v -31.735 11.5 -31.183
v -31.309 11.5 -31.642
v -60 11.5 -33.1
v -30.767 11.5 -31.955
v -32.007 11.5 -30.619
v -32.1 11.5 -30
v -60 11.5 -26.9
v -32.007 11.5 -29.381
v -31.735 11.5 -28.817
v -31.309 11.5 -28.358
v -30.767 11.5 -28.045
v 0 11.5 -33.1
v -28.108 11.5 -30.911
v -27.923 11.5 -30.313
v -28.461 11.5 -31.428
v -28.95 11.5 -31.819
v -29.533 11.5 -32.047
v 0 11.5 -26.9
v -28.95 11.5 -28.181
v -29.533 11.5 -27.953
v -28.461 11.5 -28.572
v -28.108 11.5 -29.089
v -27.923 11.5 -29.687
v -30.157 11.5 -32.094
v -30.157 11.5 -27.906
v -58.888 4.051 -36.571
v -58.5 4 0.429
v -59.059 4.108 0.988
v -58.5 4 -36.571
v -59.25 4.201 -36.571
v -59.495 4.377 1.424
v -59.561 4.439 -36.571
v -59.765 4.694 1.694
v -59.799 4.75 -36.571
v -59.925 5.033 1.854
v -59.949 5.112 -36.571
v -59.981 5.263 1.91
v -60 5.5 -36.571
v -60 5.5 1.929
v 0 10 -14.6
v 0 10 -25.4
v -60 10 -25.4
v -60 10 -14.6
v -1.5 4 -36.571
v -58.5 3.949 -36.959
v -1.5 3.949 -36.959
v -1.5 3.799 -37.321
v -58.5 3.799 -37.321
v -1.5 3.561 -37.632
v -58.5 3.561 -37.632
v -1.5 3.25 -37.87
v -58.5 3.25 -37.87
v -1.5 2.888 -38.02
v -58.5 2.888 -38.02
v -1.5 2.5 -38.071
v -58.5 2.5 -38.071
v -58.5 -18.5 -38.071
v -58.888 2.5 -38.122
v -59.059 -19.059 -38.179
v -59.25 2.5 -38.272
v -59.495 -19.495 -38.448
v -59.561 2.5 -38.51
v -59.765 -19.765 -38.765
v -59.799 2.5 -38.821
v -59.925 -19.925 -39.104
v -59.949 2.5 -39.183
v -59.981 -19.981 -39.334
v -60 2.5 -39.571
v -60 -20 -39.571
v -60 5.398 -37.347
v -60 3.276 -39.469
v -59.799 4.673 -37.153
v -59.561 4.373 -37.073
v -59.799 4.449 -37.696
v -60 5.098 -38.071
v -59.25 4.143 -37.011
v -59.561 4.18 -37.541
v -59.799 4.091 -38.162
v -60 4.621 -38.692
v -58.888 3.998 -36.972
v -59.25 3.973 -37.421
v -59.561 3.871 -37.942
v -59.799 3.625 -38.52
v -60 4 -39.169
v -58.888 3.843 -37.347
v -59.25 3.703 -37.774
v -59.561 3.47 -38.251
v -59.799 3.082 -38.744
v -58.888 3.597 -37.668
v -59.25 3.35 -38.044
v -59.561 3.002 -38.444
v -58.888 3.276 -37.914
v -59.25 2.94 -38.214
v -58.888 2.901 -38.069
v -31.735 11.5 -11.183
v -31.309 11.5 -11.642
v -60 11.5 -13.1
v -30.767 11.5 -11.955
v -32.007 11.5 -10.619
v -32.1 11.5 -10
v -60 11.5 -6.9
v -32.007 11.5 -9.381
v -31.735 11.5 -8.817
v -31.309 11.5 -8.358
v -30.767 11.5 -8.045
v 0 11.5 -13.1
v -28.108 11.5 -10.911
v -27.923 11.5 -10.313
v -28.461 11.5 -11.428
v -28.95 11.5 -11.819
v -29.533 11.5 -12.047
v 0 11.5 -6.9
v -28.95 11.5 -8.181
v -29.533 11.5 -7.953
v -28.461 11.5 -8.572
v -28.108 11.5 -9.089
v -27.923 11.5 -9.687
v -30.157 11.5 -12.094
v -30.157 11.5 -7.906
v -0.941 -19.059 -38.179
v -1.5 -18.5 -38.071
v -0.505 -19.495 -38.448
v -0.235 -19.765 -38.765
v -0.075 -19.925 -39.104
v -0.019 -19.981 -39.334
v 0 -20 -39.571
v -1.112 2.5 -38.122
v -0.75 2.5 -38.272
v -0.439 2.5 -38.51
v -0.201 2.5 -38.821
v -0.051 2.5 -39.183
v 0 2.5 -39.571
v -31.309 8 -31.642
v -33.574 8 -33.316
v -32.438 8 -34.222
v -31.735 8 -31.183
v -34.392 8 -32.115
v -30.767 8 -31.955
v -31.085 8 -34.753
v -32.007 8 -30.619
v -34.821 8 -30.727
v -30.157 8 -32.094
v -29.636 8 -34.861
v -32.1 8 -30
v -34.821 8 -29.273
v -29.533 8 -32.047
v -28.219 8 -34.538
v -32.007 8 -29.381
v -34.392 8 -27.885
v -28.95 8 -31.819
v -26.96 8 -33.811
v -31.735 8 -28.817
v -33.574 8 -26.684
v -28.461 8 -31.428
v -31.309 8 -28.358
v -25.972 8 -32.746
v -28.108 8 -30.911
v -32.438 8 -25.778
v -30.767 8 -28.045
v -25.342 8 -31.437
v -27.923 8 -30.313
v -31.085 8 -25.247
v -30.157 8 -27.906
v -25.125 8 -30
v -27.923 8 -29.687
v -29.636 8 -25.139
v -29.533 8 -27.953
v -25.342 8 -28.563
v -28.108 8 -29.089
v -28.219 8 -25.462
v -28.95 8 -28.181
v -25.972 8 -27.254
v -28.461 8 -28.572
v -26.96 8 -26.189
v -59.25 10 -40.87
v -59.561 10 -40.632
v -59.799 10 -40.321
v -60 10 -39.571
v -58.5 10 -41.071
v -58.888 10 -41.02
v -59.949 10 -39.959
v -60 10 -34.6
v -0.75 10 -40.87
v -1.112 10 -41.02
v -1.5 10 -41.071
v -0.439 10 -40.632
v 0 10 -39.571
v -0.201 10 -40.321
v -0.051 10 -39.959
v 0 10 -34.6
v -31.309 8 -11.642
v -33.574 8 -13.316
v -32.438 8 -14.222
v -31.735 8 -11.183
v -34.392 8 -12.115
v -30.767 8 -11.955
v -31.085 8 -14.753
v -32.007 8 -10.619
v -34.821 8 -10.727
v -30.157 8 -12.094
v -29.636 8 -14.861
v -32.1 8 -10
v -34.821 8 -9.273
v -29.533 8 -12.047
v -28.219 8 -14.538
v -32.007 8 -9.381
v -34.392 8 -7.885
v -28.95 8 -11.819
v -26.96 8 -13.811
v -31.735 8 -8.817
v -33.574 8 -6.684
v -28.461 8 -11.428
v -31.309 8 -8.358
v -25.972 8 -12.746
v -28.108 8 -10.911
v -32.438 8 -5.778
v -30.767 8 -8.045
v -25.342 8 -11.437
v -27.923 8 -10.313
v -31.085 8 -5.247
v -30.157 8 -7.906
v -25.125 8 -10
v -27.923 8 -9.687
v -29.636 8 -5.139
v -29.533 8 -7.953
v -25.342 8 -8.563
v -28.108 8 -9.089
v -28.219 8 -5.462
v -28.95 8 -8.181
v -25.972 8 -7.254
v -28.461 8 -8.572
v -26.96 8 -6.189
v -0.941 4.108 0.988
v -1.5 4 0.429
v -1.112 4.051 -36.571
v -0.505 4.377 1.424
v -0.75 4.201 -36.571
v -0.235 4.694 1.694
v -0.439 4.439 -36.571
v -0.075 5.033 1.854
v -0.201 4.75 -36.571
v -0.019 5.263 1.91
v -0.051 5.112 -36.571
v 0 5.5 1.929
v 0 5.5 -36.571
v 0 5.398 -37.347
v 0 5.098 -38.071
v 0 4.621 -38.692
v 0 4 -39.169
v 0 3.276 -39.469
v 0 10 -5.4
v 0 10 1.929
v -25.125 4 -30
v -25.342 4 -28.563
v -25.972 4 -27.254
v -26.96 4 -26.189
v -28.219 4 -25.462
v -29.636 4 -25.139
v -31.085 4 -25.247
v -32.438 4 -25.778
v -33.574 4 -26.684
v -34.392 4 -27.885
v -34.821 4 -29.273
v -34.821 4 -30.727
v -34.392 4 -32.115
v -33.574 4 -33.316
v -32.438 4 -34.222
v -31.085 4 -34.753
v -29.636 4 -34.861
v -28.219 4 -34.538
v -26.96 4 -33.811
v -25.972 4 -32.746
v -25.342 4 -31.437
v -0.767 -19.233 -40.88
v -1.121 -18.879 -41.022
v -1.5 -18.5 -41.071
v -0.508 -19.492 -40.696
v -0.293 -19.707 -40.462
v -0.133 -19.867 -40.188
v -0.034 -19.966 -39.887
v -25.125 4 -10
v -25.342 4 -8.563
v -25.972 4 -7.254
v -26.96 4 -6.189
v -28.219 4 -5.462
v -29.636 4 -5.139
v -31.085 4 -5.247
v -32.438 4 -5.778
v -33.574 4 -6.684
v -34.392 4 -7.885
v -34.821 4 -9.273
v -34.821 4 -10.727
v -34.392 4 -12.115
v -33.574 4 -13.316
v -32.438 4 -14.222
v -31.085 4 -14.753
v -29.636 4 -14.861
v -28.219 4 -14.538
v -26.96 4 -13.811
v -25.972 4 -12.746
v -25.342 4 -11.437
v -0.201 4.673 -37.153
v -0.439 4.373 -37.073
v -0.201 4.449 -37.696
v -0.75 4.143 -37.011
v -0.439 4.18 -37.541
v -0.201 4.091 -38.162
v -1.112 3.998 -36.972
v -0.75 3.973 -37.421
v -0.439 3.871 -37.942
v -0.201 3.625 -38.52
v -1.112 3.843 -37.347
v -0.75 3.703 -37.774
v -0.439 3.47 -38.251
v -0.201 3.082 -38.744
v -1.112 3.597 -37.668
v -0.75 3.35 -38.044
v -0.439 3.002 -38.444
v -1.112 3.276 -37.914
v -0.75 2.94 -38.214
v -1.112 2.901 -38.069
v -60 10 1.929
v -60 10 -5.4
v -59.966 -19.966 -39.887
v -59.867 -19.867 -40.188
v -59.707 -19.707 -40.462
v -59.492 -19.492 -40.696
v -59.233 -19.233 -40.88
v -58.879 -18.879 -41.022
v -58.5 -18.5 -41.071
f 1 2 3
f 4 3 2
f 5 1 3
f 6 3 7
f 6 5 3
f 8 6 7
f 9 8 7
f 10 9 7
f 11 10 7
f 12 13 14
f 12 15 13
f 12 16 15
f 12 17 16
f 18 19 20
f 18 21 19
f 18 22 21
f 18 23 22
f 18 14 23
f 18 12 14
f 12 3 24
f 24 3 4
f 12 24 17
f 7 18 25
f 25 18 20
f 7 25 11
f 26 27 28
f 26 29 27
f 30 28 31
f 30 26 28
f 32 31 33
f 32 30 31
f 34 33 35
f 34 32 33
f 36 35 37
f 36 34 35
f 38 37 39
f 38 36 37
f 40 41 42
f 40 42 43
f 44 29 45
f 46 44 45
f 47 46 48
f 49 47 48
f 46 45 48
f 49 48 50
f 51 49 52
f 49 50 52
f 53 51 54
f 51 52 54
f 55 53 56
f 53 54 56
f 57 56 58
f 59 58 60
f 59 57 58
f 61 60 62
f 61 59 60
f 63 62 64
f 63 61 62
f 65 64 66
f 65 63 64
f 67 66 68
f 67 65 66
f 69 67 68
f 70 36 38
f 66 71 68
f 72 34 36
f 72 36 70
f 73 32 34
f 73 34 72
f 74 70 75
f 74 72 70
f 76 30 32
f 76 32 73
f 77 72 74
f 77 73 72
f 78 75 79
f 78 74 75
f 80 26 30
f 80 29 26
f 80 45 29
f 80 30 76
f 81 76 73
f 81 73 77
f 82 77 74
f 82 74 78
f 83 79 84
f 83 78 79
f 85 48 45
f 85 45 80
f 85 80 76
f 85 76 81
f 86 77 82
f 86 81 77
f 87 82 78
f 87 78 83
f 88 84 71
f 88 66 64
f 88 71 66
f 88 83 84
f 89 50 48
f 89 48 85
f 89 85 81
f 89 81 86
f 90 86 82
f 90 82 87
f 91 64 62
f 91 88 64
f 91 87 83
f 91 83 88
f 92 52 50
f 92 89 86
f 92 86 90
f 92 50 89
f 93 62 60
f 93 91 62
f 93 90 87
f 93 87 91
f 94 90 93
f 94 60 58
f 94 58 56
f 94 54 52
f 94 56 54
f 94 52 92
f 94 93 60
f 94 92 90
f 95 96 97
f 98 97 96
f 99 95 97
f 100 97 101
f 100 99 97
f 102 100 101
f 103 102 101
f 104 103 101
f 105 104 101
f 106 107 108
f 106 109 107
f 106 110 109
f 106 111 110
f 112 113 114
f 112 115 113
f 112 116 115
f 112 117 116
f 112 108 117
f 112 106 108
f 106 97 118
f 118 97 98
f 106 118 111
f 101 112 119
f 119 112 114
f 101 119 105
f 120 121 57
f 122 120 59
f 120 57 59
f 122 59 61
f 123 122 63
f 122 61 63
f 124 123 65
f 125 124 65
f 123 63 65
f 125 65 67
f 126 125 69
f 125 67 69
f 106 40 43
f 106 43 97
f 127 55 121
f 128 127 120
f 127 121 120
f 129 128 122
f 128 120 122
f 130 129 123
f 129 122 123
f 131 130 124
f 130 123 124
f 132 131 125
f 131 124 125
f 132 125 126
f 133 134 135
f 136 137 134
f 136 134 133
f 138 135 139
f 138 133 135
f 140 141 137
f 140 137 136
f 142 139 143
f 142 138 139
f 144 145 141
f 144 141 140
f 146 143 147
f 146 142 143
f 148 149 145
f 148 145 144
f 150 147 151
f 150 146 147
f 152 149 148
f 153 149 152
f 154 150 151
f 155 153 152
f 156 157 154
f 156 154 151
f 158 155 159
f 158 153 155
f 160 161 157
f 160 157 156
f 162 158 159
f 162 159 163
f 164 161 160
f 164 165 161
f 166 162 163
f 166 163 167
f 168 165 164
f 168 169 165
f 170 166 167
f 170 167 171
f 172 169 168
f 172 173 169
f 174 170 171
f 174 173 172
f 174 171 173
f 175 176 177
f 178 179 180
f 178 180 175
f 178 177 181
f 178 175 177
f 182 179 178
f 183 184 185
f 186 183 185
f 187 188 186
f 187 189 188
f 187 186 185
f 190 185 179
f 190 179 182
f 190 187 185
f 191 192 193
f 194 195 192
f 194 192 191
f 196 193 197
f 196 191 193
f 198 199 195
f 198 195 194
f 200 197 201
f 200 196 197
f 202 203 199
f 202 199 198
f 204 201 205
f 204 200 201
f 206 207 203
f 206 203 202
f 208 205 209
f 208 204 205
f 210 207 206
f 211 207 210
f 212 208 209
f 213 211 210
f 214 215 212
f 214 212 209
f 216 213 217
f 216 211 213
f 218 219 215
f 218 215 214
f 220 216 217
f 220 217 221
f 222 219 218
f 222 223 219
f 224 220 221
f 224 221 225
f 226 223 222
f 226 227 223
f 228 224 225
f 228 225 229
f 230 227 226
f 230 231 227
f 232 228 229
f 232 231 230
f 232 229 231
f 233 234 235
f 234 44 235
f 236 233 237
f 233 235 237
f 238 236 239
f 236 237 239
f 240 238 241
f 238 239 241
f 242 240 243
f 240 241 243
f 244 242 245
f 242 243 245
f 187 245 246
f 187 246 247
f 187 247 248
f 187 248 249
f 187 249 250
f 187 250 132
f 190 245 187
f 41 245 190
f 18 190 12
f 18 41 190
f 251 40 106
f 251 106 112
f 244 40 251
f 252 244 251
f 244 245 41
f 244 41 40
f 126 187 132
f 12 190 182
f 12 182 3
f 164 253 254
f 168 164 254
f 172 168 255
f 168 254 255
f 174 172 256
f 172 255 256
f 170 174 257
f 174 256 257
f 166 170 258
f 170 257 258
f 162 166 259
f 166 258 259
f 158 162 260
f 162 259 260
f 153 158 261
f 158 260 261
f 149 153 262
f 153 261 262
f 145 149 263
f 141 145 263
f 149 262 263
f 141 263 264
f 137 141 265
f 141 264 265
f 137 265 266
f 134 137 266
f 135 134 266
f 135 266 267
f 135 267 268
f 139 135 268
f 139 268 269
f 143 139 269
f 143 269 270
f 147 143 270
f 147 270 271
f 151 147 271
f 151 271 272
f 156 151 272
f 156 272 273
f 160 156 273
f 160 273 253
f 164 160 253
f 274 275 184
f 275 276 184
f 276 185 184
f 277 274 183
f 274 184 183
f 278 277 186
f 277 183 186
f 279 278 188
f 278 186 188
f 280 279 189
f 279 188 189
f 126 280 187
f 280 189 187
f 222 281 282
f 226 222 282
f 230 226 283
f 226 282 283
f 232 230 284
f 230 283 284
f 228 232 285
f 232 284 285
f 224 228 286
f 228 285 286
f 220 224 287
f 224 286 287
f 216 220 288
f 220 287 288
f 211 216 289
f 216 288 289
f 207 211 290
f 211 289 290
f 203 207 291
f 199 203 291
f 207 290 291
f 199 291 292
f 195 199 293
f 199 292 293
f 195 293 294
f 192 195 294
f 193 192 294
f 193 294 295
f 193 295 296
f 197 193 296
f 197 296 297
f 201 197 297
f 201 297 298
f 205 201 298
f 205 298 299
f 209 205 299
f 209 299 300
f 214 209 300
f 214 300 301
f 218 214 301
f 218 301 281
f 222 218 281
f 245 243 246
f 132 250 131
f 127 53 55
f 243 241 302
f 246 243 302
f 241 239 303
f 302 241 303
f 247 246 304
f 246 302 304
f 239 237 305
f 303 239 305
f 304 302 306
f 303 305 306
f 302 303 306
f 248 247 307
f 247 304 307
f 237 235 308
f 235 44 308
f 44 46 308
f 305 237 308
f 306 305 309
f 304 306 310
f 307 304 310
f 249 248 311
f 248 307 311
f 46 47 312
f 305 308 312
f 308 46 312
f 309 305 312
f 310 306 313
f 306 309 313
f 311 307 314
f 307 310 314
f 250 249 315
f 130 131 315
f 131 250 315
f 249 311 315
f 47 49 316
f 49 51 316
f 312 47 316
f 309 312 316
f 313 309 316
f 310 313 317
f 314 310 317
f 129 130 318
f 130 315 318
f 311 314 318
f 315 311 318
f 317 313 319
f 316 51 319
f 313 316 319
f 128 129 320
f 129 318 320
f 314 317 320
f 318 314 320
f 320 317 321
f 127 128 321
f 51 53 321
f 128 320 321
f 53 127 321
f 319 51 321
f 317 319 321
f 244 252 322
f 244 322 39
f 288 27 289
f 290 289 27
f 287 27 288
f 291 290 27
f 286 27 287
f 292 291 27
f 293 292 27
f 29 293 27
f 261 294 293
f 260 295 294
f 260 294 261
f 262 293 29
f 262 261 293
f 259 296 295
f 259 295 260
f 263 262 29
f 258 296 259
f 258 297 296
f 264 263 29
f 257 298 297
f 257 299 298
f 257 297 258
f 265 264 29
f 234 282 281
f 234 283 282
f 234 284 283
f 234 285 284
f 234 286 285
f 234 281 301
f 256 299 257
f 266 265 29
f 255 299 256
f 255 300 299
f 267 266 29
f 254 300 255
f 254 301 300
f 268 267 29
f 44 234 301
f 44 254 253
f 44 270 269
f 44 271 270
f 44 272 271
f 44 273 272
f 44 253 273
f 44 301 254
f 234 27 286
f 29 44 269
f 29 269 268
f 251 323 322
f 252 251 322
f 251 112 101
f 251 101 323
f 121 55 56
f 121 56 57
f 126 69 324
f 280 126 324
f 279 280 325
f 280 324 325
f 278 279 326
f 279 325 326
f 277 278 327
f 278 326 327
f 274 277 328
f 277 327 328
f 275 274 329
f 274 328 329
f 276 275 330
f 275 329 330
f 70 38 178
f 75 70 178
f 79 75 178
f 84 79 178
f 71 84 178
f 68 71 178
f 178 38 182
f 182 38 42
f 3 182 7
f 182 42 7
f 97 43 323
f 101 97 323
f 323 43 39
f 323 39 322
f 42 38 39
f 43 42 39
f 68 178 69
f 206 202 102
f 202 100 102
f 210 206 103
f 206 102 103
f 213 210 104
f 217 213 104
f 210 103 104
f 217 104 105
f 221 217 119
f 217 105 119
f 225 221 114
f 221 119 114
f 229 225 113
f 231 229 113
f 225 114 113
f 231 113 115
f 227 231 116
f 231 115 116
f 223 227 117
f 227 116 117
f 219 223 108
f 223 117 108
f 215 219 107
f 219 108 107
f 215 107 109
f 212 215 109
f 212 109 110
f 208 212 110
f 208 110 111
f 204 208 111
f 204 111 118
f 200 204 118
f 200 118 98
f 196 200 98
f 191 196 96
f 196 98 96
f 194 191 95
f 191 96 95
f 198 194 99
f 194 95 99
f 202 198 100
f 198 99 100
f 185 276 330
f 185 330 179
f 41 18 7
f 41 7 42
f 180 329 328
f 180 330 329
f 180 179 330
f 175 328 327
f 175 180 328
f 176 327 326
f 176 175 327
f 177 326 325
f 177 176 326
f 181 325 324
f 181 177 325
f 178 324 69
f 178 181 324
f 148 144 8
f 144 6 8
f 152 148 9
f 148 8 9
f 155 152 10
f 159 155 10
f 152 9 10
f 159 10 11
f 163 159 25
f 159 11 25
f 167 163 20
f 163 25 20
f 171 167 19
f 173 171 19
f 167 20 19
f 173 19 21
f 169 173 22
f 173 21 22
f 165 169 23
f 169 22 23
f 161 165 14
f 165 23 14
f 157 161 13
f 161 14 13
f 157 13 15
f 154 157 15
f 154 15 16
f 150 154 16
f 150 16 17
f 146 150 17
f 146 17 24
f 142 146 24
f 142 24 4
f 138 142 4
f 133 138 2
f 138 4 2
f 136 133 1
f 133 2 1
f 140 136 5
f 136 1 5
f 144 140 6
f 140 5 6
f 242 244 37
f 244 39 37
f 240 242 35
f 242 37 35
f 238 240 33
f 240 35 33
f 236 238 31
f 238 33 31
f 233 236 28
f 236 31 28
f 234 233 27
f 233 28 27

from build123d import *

# Parameters (mm, degrees)
F1_DEPTH       = 60
F2_R           = 1.49999
F4_D           = 4.2
F4_CBORE_D     = 9.75
F4_CBORE_DEPTH = 4


# Not quite as in the source:
# - a fillet or chamfer is up to 0.001 mm smaller than in the source, because OpenCascade refuses the exact size
# - a feature names something its author has since deleted; it is built from what else it names


with BuildPart() as f1:
    # F0 (on Right) → F1 (new body)
    with BuildSketch(Plane.YZ):
        Polygon((10, 1.9290046394), (4, 1.9290046394), (4, -38.0709953606), (-20, -38.0709953606), (-20, -41.0709953606), (10, -41.0709953606), (10, -34.6), (11.5, -33.1), (11.5, -26.9), (10, -25.4), (10, -14.6), (11.5, -13.1), (11.5, -6.9), (10, -5.4), align=None)
    extrude(amount=-F1_DEPTH)

    # F2 (radius 1.5 in the source; OpenCascade refuses exactly that, so slightly less here)
    f2_edges = [f1.edges().sort_by_distance(p)[0] for p in [
        (0, 4, -18.070995),
        (-60, 4, -18.070995),
        (0, -8, -38.070995),
        (-30, -20, -38.070995),
        (-60, -8, -38.070995),
        (-30, 4, -38.070995),
        (-30, -20, -41.070995),
        (0, -5, -41.070995),
        (-60, -5, -41.070995),
        (-30, 4, 1.929005),
    ]]
    fillet(f2_edges, radius=F2_R)

    # F4 (through all)
    with Locations(Plane.XZ.offset(-4)):
        with Locations((-30, -9.9999953606), (-30, -29.9999953606)):
            CounterBoreHole(F4_D / 2, F4_CBORE_D / 2, F4_CBORE_DEPTH)


solid = f1.part
